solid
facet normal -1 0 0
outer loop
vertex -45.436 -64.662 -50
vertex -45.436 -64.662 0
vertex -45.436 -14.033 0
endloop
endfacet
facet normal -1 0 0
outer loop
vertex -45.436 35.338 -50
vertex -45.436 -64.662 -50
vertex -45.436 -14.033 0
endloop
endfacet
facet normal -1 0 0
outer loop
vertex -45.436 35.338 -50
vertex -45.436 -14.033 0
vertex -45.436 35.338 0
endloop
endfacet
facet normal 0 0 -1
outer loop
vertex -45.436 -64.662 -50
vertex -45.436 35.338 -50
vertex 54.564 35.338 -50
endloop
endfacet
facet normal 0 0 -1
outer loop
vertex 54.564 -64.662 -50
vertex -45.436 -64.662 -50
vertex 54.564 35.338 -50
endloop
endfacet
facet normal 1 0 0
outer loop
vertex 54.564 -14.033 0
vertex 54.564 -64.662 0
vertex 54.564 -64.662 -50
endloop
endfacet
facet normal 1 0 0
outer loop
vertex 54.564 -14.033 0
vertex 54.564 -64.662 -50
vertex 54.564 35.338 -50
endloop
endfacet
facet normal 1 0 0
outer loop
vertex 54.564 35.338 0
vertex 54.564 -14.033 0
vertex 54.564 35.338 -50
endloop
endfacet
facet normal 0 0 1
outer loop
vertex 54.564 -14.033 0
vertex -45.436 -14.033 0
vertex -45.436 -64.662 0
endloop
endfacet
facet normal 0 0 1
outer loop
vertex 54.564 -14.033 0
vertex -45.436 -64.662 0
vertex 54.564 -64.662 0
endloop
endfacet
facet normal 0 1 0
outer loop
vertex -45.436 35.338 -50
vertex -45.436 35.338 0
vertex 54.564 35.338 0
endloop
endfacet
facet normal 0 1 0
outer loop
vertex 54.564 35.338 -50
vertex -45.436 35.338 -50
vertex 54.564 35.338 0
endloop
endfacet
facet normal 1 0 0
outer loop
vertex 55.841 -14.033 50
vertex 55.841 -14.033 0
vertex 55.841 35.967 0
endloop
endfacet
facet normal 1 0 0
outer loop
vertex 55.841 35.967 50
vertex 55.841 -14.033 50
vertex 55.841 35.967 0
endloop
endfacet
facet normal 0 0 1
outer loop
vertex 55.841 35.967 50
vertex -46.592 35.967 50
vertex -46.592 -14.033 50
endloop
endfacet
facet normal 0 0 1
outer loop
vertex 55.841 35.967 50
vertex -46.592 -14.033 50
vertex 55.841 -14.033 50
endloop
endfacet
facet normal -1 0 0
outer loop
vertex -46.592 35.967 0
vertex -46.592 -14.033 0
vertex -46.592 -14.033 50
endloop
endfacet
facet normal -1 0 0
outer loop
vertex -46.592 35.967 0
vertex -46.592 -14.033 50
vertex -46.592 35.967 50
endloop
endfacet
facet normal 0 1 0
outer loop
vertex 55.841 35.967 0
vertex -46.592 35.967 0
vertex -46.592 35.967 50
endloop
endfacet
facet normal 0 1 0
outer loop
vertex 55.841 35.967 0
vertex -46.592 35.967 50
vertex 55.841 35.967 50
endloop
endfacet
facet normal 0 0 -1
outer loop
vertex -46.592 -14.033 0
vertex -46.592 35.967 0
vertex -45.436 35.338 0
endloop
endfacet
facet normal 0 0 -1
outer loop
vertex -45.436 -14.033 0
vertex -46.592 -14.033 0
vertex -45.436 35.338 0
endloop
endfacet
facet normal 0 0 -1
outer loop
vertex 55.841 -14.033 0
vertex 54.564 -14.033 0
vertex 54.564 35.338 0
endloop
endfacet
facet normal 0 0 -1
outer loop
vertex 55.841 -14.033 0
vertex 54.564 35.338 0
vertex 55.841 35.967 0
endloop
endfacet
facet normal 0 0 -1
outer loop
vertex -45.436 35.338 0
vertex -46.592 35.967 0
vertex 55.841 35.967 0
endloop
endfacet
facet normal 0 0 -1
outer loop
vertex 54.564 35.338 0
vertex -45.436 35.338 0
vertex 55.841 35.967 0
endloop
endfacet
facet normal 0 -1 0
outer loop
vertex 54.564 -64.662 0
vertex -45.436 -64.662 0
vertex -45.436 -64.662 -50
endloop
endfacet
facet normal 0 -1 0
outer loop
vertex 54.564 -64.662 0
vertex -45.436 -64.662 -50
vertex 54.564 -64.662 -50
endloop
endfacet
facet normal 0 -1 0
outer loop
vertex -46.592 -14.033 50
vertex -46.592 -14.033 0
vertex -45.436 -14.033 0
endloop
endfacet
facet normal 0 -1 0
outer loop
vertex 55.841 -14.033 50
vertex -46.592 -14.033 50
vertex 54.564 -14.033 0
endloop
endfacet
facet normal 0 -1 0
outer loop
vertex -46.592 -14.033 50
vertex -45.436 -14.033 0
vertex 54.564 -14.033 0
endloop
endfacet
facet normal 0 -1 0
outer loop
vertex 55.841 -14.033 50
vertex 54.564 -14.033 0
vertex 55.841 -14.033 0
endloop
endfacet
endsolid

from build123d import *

# Parameters (mm, degrees)
F0_W     = 100
F0_H     = 100
F1_DEPTH = 50
F2_W     = 102.432432
F2_H     = 50
F3_DEPTH = 50


with BuildPart() as f1:
    # F0 (on Top) → F1 (new body)
    with BuildSketch(Plane.XY):
        with Locations((4.56433, -14.662177)):
            Rectangle(F0_W, F0_H)
    extrude(amount=-F1_DEPTH)

    # F2 (on Top) → F3 (join)
    with BuildSketch(Plane.XY):
        with Locations((4.624579, 10.966863)):
            Rectangle(F2_W, F2_H)
    extrude(amount=F3_DEPTH)


solid = f1.part
